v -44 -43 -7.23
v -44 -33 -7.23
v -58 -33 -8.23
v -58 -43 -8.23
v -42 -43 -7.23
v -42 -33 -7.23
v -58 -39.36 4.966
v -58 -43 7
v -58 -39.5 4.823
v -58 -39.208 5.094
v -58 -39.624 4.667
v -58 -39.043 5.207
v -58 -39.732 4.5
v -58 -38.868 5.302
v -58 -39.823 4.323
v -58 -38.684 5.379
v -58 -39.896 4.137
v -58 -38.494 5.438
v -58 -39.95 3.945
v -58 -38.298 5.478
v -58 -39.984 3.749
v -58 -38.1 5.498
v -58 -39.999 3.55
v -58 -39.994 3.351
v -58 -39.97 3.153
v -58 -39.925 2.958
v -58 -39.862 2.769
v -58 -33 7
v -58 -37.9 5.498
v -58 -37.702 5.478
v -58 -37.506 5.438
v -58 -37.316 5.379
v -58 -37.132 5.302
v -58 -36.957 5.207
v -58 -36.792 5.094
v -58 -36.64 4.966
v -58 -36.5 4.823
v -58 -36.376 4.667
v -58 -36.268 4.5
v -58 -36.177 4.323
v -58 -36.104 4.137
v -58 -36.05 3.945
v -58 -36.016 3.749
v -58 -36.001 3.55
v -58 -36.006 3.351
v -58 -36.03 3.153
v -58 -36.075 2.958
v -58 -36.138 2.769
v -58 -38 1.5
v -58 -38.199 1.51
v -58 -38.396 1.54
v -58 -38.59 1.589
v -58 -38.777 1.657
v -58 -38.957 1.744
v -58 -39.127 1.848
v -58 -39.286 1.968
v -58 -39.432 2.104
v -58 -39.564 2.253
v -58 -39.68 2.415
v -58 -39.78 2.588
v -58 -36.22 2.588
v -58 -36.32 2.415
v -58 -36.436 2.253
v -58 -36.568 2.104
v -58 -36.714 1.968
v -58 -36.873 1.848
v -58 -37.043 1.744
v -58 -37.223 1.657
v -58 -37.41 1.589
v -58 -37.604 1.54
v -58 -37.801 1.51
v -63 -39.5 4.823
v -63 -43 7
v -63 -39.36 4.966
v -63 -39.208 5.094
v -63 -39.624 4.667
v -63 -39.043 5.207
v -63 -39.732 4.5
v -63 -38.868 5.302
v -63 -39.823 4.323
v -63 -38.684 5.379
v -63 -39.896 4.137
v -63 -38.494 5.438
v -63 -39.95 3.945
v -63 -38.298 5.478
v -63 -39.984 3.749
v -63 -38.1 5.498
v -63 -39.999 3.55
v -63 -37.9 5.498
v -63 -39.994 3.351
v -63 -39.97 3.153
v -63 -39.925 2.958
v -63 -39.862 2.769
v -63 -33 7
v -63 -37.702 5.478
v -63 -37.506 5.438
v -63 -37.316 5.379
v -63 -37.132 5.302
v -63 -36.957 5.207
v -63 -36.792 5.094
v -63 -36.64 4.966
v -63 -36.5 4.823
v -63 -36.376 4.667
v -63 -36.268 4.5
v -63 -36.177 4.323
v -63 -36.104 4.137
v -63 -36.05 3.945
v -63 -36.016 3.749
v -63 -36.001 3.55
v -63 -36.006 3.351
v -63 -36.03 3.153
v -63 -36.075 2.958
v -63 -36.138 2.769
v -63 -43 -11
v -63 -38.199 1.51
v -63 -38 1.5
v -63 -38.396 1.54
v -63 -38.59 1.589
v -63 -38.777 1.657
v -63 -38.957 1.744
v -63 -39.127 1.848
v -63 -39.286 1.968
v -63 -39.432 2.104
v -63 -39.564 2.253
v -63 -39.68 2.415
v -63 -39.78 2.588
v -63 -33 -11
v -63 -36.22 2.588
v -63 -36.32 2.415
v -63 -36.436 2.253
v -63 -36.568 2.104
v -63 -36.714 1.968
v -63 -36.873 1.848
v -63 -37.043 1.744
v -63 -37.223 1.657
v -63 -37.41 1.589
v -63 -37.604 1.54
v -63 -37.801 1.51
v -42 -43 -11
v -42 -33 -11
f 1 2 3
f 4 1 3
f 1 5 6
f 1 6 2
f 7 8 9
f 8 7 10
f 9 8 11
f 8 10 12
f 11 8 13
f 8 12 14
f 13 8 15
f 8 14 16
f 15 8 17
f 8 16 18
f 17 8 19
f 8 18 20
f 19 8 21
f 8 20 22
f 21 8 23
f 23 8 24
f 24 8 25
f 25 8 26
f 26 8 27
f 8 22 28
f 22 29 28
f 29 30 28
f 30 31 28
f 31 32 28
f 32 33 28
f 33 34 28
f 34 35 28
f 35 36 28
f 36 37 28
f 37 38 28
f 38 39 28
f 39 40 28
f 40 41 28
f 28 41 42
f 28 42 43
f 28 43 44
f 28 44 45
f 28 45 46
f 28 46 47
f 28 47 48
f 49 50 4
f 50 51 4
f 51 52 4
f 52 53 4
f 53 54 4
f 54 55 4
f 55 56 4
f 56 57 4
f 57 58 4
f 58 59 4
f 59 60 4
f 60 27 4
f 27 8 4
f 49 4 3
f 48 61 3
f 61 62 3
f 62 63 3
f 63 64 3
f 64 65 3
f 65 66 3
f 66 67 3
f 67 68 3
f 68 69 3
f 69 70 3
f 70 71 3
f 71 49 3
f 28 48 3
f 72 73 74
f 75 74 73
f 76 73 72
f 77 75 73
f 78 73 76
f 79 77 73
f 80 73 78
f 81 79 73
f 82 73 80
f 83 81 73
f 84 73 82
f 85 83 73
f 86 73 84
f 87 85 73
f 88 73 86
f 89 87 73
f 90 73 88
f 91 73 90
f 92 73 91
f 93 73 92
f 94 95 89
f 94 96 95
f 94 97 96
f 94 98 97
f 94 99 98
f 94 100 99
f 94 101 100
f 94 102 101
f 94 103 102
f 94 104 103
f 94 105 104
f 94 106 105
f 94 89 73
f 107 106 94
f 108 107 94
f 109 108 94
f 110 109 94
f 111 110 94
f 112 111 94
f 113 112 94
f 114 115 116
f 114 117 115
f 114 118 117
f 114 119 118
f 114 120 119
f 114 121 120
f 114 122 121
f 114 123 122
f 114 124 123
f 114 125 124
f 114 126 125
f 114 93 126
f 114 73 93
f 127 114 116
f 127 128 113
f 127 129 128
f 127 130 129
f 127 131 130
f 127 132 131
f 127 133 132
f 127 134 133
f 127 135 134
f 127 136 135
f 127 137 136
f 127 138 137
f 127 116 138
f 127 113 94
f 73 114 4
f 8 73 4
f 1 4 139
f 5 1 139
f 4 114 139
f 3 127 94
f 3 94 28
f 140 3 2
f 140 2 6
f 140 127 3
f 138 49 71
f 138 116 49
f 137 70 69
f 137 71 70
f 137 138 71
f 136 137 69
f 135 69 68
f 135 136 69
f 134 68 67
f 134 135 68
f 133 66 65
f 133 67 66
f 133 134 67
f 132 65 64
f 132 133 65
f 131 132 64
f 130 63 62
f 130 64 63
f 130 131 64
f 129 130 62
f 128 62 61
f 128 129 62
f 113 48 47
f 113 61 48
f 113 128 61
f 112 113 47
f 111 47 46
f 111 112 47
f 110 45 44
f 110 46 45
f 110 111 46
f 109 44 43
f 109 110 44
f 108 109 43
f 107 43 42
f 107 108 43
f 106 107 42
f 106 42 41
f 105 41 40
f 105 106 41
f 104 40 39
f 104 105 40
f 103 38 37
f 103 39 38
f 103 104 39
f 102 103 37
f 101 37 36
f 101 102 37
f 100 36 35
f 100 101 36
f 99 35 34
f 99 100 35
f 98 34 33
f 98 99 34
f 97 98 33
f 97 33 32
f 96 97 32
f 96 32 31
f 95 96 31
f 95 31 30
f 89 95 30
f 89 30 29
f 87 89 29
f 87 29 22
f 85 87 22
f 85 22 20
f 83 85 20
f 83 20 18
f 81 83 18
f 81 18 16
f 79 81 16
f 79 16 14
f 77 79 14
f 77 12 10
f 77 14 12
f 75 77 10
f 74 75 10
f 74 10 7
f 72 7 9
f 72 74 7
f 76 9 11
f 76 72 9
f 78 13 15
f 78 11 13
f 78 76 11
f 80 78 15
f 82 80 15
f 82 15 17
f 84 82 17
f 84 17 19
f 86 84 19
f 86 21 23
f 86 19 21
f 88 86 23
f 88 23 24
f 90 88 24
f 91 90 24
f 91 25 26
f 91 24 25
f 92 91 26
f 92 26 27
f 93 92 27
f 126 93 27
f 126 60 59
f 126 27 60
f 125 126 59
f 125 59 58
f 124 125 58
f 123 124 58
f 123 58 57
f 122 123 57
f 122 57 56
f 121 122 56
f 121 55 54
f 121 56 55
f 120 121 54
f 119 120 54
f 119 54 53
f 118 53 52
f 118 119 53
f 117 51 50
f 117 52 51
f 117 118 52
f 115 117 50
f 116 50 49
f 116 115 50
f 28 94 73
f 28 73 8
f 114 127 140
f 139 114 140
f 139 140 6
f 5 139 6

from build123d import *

# Parameters (mm, degrees)
CYLINDER002_R     = 2
CYLINDER002_DEPTH = 10
BOX002_W          = 5
BOX002_H          = 10
BOX002_DEPTH      = 18
EXTRUDE_DEPTH     = 10


with BuildPart() as cylinder002:
    # Cylinder002 → Cylinder002 (new body)
    with BuildSketch(Plane(origin=(-65, -38, 3.5), x_dir=(0, 0, -1), z_dir=(1, 0, 0))):
        Circle(CYLINDER002_R)
    extrude(amount=CYLINDER002_DEPTH)


with BuildPart() as cut002:
    # Box002 → Box002 (new body)
    with BuildSketch(Plane(origin=(-63, -43, -11), x_dir=(1, 0, 0), z_dir=(0, 0, 1))):
        with Locations((2.5, 5)):
            Rectangle(BOX002_W, BOX002_H)
    extrude(amount=BOX002_DEPTH)

    # Cut002: cut Cylinder002
    add(cylinder002.part, mode=Mode.SUBTRACT)


with BuildPart() as fusion001:
    # Sketch → Extrude (new body)
    with BuildSketch(Plane.XZ):
        Polygon((-49.224583, -10.083495), (-33.224583, -10.083495), (-33.224583, -6.313495), (-35.224583, -6.313495), (-49.224583, -7.313495), align=None)
    extrude(amount=EXTRUDE_DEPTH)


with BuildPart() as fusion001_1:
    # Extrude placement: moved
    add(fusion001.part.moved(Location((-8.775417, -33, -0.916505))))

    # Fusion001: union Cut002
    add(cut002.part)


solid = fusion001_1.part
